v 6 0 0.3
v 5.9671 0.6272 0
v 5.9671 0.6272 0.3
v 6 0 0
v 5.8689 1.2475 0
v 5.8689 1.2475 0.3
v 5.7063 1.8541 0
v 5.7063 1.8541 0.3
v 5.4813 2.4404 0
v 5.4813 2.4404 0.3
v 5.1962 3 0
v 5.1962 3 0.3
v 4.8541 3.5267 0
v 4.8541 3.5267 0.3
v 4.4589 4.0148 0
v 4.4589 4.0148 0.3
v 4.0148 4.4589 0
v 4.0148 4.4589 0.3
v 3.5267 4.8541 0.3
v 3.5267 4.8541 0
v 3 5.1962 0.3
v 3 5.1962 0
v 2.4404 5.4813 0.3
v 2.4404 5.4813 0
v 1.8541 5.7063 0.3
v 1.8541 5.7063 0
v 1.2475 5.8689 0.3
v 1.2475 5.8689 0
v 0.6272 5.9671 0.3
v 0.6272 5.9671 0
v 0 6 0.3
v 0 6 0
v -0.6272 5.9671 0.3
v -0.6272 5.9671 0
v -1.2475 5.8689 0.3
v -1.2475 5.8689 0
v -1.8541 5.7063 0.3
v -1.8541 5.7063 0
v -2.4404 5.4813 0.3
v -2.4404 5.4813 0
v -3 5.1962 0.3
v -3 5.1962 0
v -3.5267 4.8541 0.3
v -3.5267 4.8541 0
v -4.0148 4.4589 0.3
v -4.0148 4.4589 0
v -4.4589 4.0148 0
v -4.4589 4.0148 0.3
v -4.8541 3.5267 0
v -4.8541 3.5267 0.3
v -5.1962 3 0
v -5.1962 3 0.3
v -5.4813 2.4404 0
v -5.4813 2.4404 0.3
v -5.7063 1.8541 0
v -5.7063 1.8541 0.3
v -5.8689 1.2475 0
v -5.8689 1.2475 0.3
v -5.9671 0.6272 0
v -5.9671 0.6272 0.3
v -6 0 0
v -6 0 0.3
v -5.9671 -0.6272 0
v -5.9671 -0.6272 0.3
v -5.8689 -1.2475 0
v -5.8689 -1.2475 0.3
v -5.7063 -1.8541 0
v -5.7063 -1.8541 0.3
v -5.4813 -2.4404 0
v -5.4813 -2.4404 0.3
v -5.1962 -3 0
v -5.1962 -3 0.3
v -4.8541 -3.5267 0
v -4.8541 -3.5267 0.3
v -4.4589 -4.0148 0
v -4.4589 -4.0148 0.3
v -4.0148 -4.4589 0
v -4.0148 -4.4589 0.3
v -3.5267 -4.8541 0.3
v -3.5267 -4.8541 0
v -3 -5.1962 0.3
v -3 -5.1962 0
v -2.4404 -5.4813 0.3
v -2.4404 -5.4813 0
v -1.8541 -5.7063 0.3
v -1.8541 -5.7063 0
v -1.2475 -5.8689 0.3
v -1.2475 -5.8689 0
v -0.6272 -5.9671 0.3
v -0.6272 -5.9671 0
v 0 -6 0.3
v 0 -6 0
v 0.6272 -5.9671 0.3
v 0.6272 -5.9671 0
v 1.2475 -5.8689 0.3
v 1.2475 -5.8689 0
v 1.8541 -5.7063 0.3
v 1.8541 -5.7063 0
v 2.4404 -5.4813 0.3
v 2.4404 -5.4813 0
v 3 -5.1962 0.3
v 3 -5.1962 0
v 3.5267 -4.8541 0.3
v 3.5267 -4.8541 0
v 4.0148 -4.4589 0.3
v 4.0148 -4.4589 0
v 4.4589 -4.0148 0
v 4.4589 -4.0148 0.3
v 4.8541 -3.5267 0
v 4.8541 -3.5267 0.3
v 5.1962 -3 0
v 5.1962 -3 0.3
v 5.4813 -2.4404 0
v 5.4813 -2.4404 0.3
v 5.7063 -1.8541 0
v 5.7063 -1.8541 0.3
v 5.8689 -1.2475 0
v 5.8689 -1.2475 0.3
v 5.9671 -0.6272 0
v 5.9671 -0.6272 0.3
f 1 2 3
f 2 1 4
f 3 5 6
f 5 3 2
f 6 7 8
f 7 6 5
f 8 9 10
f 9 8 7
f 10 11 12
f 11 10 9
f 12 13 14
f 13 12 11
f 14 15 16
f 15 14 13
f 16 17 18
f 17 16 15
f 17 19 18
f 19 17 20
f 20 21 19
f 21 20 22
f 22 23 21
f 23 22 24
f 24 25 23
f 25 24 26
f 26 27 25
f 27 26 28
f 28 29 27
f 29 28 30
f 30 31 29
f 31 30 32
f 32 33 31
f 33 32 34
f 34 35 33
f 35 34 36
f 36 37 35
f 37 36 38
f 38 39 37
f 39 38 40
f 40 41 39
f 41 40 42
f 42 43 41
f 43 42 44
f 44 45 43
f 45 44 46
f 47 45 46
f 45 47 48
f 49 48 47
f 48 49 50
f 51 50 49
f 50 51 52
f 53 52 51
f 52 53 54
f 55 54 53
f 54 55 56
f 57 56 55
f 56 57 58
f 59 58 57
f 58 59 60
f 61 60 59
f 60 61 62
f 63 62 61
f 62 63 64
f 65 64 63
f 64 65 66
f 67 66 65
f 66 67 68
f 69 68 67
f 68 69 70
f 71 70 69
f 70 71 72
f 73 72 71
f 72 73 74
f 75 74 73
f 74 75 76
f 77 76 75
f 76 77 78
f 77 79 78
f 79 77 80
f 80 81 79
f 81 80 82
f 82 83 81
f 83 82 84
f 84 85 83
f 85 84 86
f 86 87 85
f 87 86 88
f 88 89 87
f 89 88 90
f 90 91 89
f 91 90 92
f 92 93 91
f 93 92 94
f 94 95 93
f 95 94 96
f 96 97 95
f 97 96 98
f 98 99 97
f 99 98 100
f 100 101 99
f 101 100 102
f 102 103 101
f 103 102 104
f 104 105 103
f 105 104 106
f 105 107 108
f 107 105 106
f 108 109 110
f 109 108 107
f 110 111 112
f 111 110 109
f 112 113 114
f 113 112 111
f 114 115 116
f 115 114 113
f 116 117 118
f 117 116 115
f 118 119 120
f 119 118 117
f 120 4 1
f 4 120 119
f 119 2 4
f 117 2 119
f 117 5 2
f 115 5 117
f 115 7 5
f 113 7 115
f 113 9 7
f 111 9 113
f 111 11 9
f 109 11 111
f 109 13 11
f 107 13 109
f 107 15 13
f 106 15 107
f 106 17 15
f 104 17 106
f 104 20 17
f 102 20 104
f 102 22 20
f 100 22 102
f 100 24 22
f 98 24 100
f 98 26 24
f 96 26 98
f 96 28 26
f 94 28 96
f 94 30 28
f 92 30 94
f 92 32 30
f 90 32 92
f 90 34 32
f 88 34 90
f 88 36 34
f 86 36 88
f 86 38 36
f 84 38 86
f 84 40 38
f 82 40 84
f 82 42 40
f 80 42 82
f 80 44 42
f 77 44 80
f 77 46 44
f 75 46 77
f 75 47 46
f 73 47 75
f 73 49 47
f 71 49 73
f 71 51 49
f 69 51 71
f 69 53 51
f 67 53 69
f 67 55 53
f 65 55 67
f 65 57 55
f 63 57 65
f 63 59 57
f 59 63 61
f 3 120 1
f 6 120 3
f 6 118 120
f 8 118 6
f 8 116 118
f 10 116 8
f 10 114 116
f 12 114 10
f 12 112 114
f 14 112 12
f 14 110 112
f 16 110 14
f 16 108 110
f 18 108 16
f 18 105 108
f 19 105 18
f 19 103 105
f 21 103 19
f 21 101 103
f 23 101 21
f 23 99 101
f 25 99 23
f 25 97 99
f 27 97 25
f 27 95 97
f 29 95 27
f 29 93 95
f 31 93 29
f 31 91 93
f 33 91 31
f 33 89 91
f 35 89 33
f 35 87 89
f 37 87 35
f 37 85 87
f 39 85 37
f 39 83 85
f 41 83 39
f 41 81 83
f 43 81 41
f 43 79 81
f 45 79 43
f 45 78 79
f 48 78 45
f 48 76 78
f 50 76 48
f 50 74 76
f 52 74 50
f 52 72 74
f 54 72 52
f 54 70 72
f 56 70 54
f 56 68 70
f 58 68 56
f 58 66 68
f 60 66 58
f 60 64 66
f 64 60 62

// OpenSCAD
Ear();
//cubeEars();

module Ear(x=0, y=0, z=0, r=6, t=0.3)
{
	translate([x, y, z - (z == 0 ? 0 : t)])
		color("orange") cylinder(h=t,r=r, $fn=60);
}

module cubeEars(size = [20, 20, 0])
{
	// bed adhession helpers
	for( x=[-1,1], y=[-1,1]){
		Ear(size[0]/2 * x, size[1]/2 *y, size[2]);
	}
}
